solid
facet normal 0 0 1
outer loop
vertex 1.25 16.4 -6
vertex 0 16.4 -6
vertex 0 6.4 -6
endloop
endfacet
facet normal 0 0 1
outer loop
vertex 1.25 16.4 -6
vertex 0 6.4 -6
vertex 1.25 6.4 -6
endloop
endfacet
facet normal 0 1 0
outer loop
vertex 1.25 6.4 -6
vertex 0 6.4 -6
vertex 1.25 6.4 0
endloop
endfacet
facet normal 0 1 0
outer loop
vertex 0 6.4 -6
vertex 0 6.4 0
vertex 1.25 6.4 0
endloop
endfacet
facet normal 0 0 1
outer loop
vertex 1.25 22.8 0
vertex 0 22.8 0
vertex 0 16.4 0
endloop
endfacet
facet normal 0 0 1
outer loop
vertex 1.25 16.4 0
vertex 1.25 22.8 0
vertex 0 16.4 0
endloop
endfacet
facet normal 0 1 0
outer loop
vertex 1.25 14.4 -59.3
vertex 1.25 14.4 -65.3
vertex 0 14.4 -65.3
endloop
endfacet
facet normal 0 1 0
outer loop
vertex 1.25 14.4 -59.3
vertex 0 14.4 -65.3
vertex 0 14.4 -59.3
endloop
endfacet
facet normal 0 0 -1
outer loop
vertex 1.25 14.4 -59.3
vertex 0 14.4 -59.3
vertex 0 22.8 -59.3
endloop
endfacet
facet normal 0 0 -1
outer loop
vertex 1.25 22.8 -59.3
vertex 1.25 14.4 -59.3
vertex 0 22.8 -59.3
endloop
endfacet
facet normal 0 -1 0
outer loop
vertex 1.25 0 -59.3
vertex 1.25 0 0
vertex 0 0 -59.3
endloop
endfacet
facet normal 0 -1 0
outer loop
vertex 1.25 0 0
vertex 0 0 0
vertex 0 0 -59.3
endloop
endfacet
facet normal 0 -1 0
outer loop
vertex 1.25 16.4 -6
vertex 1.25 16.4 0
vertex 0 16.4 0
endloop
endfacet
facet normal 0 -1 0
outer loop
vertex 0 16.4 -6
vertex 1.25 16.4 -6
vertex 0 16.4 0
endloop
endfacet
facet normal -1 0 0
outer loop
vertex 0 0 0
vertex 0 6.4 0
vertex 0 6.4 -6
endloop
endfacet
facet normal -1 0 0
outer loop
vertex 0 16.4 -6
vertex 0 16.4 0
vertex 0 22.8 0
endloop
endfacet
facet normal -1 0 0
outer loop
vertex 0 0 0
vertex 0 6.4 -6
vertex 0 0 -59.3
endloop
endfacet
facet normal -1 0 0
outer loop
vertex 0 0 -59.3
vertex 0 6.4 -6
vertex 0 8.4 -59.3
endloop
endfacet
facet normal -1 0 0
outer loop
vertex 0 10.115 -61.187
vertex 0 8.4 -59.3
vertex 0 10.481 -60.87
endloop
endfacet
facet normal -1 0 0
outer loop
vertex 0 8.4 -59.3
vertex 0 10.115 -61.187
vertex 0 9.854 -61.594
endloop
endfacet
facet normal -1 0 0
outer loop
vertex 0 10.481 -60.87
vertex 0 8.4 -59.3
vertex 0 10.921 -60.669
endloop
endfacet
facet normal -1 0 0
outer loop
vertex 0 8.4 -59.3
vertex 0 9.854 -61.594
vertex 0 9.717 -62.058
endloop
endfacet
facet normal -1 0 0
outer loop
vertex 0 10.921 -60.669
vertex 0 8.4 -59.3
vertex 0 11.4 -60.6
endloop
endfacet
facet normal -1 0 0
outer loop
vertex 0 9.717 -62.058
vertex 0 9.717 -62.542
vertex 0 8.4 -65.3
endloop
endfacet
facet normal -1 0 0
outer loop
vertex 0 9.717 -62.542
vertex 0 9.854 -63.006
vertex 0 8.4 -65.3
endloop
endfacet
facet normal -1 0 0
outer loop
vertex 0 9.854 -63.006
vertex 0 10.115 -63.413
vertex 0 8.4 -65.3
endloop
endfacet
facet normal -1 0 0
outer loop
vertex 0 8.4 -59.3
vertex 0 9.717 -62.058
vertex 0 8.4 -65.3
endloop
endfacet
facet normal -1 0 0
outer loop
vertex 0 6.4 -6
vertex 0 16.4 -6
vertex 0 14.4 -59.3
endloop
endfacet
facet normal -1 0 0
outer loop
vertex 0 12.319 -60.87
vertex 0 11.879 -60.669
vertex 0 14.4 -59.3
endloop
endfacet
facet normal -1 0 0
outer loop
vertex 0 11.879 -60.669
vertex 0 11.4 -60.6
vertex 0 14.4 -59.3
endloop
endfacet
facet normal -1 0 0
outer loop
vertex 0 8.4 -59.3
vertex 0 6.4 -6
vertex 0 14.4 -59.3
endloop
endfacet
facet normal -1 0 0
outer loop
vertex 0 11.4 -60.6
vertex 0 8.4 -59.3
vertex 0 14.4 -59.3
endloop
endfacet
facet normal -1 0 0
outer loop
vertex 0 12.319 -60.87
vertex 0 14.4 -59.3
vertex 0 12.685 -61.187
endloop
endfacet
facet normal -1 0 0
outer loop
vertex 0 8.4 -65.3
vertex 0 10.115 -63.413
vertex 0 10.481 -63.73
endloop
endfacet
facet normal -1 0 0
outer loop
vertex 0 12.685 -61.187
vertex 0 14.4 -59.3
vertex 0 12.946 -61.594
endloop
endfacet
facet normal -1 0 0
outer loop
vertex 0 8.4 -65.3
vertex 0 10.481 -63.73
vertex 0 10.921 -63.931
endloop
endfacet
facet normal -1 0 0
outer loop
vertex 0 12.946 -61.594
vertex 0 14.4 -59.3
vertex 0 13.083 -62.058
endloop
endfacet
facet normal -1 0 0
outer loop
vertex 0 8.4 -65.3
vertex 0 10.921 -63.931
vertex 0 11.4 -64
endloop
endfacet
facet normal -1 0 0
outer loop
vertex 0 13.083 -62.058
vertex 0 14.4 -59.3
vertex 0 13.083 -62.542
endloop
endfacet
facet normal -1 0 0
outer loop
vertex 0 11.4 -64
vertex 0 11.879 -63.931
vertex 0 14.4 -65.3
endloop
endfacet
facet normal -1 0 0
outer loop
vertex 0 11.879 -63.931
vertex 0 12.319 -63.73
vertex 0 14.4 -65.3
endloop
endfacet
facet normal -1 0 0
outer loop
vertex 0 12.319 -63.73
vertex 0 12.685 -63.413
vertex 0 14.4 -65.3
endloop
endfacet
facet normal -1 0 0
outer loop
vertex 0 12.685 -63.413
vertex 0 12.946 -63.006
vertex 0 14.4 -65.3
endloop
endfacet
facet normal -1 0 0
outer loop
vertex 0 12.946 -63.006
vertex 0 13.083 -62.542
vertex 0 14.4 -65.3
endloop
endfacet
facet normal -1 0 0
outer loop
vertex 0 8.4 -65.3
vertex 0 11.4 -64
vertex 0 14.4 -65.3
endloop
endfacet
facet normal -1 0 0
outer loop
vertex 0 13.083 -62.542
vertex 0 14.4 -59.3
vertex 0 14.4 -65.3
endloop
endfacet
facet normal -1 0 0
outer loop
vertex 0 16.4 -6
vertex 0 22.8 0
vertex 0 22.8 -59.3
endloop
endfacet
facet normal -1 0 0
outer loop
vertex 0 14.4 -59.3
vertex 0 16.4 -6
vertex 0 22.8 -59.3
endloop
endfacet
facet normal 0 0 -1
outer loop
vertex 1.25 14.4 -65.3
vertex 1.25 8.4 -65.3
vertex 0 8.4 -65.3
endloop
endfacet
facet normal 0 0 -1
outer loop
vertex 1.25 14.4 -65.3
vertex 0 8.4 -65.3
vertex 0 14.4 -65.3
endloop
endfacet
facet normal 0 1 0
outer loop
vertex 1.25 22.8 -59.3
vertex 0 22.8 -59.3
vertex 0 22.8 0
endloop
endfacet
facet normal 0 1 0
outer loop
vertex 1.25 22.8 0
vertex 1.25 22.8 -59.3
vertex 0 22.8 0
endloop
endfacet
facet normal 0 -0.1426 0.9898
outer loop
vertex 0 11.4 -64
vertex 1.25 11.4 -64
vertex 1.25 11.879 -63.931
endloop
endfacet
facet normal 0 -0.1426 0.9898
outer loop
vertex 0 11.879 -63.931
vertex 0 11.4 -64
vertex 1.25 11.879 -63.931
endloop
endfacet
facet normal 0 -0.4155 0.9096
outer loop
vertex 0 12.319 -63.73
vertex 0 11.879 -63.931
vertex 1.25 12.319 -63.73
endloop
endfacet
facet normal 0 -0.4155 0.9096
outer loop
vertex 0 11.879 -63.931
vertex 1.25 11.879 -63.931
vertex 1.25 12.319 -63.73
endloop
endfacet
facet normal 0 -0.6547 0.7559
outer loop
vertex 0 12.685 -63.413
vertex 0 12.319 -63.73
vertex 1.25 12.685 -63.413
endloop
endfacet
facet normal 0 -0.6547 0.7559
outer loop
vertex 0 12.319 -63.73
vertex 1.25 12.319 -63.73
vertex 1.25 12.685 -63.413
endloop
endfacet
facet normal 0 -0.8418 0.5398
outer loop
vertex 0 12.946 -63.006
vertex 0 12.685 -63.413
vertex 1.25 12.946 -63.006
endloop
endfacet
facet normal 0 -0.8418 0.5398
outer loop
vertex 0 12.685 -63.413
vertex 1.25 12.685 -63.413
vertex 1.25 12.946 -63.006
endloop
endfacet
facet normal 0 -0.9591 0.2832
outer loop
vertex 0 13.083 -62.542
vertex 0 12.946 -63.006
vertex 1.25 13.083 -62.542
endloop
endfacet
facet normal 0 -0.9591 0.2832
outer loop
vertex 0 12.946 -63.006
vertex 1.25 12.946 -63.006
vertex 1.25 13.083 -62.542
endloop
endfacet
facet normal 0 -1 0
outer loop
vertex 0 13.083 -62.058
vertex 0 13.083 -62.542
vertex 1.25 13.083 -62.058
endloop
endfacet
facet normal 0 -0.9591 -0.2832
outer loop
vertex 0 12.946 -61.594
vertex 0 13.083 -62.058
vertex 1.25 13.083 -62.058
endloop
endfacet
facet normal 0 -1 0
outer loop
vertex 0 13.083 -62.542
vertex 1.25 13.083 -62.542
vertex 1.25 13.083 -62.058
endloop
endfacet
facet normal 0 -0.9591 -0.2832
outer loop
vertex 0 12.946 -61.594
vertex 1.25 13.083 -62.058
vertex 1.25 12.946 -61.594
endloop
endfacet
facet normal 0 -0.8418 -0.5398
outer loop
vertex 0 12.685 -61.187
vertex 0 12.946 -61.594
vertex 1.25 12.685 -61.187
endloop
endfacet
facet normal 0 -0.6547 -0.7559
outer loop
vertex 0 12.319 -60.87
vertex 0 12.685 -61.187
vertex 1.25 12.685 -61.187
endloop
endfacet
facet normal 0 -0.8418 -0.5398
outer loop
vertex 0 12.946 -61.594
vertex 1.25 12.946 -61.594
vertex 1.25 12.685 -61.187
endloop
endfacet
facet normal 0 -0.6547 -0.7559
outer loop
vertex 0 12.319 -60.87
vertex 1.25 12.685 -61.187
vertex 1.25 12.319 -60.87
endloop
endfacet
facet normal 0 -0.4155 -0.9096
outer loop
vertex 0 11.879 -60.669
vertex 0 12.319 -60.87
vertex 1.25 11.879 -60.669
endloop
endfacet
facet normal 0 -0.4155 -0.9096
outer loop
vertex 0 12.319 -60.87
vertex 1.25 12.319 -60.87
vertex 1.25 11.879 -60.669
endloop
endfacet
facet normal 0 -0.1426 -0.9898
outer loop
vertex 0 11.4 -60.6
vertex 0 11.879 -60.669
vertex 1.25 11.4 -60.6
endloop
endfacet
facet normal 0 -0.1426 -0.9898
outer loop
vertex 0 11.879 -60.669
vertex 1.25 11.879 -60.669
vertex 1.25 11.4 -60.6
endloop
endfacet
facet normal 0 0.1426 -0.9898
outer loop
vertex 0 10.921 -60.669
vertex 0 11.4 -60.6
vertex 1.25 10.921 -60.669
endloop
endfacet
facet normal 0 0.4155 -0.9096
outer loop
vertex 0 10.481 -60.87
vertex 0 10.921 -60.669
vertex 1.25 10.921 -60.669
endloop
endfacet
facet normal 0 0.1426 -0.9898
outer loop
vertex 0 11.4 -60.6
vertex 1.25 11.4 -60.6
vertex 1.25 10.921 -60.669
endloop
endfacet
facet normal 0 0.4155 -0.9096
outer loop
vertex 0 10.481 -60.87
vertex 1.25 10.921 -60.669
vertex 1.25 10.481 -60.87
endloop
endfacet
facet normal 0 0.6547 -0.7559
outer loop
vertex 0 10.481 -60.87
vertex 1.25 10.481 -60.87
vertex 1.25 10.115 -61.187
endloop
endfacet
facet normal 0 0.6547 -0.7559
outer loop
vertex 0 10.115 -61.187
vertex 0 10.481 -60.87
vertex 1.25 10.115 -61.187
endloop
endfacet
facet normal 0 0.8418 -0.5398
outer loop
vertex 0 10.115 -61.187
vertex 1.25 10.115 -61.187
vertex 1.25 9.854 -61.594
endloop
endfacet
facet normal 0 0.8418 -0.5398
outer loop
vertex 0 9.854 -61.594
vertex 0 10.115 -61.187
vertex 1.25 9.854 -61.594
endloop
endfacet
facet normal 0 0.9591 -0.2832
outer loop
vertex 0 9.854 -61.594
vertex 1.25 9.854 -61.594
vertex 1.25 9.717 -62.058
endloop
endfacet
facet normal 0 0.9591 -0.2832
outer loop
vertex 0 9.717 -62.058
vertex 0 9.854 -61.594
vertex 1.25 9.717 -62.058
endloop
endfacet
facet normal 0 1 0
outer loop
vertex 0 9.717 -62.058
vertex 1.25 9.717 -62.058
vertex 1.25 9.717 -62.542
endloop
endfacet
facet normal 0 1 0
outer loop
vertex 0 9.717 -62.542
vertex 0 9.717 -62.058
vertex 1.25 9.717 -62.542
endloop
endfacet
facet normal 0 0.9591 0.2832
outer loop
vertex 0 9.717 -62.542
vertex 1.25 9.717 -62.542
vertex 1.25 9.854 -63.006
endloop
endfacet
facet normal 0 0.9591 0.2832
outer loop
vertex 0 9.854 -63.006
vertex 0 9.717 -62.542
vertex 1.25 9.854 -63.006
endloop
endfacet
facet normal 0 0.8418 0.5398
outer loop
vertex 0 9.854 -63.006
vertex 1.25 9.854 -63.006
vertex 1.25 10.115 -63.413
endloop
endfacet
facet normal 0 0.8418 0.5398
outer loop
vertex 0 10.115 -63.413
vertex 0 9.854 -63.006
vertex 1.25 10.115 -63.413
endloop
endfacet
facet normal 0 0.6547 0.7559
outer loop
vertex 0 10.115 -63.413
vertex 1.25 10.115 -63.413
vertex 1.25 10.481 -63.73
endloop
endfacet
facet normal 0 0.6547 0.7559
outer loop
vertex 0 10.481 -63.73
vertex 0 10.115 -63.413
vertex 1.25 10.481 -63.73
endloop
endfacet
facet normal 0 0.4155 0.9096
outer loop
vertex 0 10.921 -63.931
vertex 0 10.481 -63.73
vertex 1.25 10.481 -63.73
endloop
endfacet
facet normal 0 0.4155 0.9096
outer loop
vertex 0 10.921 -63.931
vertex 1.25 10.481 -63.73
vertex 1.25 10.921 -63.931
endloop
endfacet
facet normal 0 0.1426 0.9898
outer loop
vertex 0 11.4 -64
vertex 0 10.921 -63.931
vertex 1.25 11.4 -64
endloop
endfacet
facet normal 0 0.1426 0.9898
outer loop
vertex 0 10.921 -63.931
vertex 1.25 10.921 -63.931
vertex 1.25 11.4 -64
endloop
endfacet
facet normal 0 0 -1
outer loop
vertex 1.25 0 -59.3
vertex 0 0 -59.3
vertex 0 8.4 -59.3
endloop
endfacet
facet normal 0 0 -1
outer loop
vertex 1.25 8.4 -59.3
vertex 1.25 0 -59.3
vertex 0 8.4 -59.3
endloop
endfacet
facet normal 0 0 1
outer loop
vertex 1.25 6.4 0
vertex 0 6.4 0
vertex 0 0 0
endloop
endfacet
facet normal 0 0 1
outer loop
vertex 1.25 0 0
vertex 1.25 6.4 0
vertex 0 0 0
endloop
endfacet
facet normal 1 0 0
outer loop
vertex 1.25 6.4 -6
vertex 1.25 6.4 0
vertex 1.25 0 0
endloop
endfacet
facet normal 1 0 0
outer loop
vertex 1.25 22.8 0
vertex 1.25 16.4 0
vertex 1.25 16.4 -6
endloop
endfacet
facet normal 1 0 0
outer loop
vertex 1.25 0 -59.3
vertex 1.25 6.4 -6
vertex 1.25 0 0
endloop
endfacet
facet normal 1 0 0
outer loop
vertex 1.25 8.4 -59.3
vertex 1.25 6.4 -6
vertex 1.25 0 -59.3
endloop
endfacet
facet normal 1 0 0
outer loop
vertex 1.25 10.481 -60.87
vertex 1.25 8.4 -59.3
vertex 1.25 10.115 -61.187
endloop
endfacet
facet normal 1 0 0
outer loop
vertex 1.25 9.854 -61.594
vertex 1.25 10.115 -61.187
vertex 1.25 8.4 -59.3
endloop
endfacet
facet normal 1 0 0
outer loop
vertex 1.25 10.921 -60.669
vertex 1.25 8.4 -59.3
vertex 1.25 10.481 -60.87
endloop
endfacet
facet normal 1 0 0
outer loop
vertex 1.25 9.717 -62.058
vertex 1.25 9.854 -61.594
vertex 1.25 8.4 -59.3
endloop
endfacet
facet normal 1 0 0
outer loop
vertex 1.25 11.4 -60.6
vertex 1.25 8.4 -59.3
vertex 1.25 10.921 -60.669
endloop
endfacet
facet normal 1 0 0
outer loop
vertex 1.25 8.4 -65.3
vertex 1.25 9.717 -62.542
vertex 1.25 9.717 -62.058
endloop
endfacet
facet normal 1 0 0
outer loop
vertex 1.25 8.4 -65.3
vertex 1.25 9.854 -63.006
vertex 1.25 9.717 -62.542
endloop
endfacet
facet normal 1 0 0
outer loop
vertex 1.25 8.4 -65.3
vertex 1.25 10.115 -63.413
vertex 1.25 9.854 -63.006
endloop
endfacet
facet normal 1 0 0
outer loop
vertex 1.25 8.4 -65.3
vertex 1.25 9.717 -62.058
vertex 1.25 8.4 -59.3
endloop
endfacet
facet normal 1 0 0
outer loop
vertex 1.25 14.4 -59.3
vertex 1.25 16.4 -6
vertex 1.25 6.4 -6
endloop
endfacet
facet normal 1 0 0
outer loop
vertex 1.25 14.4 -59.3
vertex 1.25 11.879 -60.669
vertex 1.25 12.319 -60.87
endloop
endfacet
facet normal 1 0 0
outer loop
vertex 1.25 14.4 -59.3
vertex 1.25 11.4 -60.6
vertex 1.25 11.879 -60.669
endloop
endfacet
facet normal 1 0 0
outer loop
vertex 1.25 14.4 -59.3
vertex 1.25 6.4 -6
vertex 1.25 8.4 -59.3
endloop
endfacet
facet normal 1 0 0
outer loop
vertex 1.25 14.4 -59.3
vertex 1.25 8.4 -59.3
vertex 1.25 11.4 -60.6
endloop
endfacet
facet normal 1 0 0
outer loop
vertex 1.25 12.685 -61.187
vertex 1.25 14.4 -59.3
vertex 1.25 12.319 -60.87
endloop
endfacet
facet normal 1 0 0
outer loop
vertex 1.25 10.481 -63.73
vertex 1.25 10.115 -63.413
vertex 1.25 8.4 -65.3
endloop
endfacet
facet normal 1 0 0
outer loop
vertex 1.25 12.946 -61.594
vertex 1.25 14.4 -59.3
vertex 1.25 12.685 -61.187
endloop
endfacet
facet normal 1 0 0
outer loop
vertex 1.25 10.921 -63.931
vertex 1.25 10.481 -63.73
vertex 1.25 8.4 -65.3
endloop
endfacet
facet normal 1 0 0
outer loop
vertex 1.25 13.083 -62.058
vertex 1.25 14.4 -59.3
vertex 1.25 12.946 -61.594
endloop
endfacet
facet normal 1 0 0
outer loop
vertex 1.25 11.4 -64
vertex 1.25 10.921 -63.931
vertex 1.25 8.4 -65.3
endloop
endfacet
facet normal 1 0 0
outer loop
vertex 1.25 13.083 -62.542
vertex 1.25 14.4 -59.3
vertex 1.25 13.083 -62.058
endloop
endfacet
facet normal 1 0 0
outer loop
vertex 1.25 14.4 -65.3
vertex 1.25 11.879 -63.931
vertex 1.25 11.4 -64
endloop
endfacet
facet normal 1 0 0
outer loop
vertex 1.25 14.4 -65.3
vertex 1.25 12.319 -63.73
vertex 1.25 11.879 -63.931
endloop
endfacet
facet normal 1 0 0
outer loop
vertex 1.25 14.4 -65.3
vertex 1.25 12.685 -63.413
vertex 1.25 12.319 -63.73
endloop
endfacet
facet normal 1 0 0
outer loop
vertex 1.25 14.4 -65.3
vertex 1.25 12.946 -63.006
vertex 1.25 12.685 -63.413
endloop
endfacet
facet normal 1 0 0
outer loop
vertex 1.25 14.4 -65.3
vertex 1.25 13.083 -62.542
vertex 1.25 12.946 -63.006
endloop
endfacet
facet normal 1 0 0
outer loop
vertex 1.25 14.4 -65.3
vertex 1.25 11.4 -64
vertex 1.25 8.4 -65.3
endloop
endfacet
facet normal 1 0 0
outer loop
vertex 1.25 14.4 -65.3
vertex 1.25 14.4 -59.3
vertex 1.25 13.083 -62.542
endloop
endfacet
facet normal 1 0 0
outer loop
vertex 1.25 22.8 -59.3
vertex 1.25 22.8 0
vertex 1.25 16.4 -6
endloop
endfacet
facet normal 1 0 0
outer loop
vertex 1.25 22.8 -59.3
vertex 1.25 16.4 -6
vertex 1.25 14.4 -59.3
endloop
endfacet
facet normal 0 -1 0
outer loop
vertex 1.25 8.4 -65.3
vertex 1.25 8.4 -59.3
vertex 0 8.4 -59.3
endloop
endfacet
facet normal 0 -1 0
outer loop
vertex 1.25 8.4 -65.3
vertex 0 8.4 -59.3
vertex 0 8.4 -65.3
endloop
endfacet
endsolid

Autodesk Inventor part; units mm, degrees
ref_plane "YZ Plane" through (0, 0, 0) normal (1, 0, 0) x (0, 1, 0)
ref_plane "XZ Plane" through (0, 0, 0) normal (0, 1, 0) x (-1, 0, 0)
ref_plane "XY Plane" through (0, 0, 0) normal (0, 0, 1) x (1, 0, 0)
sketch "Sketch1" plane through (0, 0, 0) normal (1, 0, 0) x (0, 1, 0)
  line L0 (0, 0) -> (0, -59.3)
  line L1 (0, -59.3) -> (22.8, -59.3)
  line L2 (22.8, -59.3) -> (22.8, 0)
  line L3 (22.8, 0) -> (0, 0)
  dimension "d0" = 59.3
  dimension "d1" = 22.8
extrude "Extrusion1" add sketch "Sketch1" along normal blind 1.25
sketch "Sketch2" plane through (0, 0, 0) normal (0, 0, 1) x (1, 0, 0)
  line L0 (0, 22.8) -> (0, 0) projected
  line L1 (0, 0) -> (1.25, 0) projected
  line L2 (1.25, 22.8) -> (1.25, 0) projected
  line L3 (0, 22.8) -> (1.25, 22.8) projected
  line L4 (1.25, 0) -> (1.25, 22.8) projected
  line L5 (1.25, 22.8) -> (1.25, 11.4)
  line L6 (1.25, 11.4) -> (1.25, 16.4)
  line L7 (1.25, 16.4) -> (0, 16.4)
  line L8 (0, 0) -> (0, 22.8) projected
  line L9 (0, 16.4) -> (0, 6.4)
  line L10 (0, 6.4) -> (1.25, 6.4)
  dimension "d4" = 11.4
  dimension "d5" = 5
  dimension "d6" = 10
extrude "Extrusion2" cut sketch "Sketch2" against normal blind 6 contours L7 L2 L10 L0
sketch "Sketch3" plane through (1.25, 0, 0) normal (1, 0, 0) x (0, 0, -1)
  line L0 (6, 6.4) -> (0, 6.4) projected
  line L1 (0, 6.4) -> (0, 0) projected
  line L2 (0, 0) -> (59.3, 0) projected
  line L3 (59.3, 0) -> (59.3, 22.8) projected
  line L4 (59.3, 22.8) -> (0, 22.8) projected
  line L5 (0, 22.8) -> (0, 16.4) projected
  line L6 (0, 16.4) -> (6, 16.4) projected
  line L7 (6, 16.4) -> (6, 6.4) projected
  line L8 (59.3, 0) -> (59.3, 22.8) projected
  line L9 (59.3, 0) -> (59.3, 11.4)
  line L10 (59.3, 11.4) -> (59.3, 8.4)
  line L11 (59.3, 8.4) -> (65.3, 8.4)
  line L12 (65.3, 8.4) -> (65.3, 14.4)
  line L13 (65.3, 14.4) -> (59.3, 14.4)
  line L14 (59.3, 11.4) -> (62.3, 11.4)
  circle A0 centre (62.3, 11.4) radius 1.7
  dimension "d9" = 11.4
  dimension "d10" = 3
  dimension "d11" = 6
  dimension "d12" = 6
  dimension "d13" = 3.4
extrude "Extrusion3" add sketch "Sketch3" against normal blind 1.25 contours L3 L13 L12 L11
properties part number "tapa_carcasa"
